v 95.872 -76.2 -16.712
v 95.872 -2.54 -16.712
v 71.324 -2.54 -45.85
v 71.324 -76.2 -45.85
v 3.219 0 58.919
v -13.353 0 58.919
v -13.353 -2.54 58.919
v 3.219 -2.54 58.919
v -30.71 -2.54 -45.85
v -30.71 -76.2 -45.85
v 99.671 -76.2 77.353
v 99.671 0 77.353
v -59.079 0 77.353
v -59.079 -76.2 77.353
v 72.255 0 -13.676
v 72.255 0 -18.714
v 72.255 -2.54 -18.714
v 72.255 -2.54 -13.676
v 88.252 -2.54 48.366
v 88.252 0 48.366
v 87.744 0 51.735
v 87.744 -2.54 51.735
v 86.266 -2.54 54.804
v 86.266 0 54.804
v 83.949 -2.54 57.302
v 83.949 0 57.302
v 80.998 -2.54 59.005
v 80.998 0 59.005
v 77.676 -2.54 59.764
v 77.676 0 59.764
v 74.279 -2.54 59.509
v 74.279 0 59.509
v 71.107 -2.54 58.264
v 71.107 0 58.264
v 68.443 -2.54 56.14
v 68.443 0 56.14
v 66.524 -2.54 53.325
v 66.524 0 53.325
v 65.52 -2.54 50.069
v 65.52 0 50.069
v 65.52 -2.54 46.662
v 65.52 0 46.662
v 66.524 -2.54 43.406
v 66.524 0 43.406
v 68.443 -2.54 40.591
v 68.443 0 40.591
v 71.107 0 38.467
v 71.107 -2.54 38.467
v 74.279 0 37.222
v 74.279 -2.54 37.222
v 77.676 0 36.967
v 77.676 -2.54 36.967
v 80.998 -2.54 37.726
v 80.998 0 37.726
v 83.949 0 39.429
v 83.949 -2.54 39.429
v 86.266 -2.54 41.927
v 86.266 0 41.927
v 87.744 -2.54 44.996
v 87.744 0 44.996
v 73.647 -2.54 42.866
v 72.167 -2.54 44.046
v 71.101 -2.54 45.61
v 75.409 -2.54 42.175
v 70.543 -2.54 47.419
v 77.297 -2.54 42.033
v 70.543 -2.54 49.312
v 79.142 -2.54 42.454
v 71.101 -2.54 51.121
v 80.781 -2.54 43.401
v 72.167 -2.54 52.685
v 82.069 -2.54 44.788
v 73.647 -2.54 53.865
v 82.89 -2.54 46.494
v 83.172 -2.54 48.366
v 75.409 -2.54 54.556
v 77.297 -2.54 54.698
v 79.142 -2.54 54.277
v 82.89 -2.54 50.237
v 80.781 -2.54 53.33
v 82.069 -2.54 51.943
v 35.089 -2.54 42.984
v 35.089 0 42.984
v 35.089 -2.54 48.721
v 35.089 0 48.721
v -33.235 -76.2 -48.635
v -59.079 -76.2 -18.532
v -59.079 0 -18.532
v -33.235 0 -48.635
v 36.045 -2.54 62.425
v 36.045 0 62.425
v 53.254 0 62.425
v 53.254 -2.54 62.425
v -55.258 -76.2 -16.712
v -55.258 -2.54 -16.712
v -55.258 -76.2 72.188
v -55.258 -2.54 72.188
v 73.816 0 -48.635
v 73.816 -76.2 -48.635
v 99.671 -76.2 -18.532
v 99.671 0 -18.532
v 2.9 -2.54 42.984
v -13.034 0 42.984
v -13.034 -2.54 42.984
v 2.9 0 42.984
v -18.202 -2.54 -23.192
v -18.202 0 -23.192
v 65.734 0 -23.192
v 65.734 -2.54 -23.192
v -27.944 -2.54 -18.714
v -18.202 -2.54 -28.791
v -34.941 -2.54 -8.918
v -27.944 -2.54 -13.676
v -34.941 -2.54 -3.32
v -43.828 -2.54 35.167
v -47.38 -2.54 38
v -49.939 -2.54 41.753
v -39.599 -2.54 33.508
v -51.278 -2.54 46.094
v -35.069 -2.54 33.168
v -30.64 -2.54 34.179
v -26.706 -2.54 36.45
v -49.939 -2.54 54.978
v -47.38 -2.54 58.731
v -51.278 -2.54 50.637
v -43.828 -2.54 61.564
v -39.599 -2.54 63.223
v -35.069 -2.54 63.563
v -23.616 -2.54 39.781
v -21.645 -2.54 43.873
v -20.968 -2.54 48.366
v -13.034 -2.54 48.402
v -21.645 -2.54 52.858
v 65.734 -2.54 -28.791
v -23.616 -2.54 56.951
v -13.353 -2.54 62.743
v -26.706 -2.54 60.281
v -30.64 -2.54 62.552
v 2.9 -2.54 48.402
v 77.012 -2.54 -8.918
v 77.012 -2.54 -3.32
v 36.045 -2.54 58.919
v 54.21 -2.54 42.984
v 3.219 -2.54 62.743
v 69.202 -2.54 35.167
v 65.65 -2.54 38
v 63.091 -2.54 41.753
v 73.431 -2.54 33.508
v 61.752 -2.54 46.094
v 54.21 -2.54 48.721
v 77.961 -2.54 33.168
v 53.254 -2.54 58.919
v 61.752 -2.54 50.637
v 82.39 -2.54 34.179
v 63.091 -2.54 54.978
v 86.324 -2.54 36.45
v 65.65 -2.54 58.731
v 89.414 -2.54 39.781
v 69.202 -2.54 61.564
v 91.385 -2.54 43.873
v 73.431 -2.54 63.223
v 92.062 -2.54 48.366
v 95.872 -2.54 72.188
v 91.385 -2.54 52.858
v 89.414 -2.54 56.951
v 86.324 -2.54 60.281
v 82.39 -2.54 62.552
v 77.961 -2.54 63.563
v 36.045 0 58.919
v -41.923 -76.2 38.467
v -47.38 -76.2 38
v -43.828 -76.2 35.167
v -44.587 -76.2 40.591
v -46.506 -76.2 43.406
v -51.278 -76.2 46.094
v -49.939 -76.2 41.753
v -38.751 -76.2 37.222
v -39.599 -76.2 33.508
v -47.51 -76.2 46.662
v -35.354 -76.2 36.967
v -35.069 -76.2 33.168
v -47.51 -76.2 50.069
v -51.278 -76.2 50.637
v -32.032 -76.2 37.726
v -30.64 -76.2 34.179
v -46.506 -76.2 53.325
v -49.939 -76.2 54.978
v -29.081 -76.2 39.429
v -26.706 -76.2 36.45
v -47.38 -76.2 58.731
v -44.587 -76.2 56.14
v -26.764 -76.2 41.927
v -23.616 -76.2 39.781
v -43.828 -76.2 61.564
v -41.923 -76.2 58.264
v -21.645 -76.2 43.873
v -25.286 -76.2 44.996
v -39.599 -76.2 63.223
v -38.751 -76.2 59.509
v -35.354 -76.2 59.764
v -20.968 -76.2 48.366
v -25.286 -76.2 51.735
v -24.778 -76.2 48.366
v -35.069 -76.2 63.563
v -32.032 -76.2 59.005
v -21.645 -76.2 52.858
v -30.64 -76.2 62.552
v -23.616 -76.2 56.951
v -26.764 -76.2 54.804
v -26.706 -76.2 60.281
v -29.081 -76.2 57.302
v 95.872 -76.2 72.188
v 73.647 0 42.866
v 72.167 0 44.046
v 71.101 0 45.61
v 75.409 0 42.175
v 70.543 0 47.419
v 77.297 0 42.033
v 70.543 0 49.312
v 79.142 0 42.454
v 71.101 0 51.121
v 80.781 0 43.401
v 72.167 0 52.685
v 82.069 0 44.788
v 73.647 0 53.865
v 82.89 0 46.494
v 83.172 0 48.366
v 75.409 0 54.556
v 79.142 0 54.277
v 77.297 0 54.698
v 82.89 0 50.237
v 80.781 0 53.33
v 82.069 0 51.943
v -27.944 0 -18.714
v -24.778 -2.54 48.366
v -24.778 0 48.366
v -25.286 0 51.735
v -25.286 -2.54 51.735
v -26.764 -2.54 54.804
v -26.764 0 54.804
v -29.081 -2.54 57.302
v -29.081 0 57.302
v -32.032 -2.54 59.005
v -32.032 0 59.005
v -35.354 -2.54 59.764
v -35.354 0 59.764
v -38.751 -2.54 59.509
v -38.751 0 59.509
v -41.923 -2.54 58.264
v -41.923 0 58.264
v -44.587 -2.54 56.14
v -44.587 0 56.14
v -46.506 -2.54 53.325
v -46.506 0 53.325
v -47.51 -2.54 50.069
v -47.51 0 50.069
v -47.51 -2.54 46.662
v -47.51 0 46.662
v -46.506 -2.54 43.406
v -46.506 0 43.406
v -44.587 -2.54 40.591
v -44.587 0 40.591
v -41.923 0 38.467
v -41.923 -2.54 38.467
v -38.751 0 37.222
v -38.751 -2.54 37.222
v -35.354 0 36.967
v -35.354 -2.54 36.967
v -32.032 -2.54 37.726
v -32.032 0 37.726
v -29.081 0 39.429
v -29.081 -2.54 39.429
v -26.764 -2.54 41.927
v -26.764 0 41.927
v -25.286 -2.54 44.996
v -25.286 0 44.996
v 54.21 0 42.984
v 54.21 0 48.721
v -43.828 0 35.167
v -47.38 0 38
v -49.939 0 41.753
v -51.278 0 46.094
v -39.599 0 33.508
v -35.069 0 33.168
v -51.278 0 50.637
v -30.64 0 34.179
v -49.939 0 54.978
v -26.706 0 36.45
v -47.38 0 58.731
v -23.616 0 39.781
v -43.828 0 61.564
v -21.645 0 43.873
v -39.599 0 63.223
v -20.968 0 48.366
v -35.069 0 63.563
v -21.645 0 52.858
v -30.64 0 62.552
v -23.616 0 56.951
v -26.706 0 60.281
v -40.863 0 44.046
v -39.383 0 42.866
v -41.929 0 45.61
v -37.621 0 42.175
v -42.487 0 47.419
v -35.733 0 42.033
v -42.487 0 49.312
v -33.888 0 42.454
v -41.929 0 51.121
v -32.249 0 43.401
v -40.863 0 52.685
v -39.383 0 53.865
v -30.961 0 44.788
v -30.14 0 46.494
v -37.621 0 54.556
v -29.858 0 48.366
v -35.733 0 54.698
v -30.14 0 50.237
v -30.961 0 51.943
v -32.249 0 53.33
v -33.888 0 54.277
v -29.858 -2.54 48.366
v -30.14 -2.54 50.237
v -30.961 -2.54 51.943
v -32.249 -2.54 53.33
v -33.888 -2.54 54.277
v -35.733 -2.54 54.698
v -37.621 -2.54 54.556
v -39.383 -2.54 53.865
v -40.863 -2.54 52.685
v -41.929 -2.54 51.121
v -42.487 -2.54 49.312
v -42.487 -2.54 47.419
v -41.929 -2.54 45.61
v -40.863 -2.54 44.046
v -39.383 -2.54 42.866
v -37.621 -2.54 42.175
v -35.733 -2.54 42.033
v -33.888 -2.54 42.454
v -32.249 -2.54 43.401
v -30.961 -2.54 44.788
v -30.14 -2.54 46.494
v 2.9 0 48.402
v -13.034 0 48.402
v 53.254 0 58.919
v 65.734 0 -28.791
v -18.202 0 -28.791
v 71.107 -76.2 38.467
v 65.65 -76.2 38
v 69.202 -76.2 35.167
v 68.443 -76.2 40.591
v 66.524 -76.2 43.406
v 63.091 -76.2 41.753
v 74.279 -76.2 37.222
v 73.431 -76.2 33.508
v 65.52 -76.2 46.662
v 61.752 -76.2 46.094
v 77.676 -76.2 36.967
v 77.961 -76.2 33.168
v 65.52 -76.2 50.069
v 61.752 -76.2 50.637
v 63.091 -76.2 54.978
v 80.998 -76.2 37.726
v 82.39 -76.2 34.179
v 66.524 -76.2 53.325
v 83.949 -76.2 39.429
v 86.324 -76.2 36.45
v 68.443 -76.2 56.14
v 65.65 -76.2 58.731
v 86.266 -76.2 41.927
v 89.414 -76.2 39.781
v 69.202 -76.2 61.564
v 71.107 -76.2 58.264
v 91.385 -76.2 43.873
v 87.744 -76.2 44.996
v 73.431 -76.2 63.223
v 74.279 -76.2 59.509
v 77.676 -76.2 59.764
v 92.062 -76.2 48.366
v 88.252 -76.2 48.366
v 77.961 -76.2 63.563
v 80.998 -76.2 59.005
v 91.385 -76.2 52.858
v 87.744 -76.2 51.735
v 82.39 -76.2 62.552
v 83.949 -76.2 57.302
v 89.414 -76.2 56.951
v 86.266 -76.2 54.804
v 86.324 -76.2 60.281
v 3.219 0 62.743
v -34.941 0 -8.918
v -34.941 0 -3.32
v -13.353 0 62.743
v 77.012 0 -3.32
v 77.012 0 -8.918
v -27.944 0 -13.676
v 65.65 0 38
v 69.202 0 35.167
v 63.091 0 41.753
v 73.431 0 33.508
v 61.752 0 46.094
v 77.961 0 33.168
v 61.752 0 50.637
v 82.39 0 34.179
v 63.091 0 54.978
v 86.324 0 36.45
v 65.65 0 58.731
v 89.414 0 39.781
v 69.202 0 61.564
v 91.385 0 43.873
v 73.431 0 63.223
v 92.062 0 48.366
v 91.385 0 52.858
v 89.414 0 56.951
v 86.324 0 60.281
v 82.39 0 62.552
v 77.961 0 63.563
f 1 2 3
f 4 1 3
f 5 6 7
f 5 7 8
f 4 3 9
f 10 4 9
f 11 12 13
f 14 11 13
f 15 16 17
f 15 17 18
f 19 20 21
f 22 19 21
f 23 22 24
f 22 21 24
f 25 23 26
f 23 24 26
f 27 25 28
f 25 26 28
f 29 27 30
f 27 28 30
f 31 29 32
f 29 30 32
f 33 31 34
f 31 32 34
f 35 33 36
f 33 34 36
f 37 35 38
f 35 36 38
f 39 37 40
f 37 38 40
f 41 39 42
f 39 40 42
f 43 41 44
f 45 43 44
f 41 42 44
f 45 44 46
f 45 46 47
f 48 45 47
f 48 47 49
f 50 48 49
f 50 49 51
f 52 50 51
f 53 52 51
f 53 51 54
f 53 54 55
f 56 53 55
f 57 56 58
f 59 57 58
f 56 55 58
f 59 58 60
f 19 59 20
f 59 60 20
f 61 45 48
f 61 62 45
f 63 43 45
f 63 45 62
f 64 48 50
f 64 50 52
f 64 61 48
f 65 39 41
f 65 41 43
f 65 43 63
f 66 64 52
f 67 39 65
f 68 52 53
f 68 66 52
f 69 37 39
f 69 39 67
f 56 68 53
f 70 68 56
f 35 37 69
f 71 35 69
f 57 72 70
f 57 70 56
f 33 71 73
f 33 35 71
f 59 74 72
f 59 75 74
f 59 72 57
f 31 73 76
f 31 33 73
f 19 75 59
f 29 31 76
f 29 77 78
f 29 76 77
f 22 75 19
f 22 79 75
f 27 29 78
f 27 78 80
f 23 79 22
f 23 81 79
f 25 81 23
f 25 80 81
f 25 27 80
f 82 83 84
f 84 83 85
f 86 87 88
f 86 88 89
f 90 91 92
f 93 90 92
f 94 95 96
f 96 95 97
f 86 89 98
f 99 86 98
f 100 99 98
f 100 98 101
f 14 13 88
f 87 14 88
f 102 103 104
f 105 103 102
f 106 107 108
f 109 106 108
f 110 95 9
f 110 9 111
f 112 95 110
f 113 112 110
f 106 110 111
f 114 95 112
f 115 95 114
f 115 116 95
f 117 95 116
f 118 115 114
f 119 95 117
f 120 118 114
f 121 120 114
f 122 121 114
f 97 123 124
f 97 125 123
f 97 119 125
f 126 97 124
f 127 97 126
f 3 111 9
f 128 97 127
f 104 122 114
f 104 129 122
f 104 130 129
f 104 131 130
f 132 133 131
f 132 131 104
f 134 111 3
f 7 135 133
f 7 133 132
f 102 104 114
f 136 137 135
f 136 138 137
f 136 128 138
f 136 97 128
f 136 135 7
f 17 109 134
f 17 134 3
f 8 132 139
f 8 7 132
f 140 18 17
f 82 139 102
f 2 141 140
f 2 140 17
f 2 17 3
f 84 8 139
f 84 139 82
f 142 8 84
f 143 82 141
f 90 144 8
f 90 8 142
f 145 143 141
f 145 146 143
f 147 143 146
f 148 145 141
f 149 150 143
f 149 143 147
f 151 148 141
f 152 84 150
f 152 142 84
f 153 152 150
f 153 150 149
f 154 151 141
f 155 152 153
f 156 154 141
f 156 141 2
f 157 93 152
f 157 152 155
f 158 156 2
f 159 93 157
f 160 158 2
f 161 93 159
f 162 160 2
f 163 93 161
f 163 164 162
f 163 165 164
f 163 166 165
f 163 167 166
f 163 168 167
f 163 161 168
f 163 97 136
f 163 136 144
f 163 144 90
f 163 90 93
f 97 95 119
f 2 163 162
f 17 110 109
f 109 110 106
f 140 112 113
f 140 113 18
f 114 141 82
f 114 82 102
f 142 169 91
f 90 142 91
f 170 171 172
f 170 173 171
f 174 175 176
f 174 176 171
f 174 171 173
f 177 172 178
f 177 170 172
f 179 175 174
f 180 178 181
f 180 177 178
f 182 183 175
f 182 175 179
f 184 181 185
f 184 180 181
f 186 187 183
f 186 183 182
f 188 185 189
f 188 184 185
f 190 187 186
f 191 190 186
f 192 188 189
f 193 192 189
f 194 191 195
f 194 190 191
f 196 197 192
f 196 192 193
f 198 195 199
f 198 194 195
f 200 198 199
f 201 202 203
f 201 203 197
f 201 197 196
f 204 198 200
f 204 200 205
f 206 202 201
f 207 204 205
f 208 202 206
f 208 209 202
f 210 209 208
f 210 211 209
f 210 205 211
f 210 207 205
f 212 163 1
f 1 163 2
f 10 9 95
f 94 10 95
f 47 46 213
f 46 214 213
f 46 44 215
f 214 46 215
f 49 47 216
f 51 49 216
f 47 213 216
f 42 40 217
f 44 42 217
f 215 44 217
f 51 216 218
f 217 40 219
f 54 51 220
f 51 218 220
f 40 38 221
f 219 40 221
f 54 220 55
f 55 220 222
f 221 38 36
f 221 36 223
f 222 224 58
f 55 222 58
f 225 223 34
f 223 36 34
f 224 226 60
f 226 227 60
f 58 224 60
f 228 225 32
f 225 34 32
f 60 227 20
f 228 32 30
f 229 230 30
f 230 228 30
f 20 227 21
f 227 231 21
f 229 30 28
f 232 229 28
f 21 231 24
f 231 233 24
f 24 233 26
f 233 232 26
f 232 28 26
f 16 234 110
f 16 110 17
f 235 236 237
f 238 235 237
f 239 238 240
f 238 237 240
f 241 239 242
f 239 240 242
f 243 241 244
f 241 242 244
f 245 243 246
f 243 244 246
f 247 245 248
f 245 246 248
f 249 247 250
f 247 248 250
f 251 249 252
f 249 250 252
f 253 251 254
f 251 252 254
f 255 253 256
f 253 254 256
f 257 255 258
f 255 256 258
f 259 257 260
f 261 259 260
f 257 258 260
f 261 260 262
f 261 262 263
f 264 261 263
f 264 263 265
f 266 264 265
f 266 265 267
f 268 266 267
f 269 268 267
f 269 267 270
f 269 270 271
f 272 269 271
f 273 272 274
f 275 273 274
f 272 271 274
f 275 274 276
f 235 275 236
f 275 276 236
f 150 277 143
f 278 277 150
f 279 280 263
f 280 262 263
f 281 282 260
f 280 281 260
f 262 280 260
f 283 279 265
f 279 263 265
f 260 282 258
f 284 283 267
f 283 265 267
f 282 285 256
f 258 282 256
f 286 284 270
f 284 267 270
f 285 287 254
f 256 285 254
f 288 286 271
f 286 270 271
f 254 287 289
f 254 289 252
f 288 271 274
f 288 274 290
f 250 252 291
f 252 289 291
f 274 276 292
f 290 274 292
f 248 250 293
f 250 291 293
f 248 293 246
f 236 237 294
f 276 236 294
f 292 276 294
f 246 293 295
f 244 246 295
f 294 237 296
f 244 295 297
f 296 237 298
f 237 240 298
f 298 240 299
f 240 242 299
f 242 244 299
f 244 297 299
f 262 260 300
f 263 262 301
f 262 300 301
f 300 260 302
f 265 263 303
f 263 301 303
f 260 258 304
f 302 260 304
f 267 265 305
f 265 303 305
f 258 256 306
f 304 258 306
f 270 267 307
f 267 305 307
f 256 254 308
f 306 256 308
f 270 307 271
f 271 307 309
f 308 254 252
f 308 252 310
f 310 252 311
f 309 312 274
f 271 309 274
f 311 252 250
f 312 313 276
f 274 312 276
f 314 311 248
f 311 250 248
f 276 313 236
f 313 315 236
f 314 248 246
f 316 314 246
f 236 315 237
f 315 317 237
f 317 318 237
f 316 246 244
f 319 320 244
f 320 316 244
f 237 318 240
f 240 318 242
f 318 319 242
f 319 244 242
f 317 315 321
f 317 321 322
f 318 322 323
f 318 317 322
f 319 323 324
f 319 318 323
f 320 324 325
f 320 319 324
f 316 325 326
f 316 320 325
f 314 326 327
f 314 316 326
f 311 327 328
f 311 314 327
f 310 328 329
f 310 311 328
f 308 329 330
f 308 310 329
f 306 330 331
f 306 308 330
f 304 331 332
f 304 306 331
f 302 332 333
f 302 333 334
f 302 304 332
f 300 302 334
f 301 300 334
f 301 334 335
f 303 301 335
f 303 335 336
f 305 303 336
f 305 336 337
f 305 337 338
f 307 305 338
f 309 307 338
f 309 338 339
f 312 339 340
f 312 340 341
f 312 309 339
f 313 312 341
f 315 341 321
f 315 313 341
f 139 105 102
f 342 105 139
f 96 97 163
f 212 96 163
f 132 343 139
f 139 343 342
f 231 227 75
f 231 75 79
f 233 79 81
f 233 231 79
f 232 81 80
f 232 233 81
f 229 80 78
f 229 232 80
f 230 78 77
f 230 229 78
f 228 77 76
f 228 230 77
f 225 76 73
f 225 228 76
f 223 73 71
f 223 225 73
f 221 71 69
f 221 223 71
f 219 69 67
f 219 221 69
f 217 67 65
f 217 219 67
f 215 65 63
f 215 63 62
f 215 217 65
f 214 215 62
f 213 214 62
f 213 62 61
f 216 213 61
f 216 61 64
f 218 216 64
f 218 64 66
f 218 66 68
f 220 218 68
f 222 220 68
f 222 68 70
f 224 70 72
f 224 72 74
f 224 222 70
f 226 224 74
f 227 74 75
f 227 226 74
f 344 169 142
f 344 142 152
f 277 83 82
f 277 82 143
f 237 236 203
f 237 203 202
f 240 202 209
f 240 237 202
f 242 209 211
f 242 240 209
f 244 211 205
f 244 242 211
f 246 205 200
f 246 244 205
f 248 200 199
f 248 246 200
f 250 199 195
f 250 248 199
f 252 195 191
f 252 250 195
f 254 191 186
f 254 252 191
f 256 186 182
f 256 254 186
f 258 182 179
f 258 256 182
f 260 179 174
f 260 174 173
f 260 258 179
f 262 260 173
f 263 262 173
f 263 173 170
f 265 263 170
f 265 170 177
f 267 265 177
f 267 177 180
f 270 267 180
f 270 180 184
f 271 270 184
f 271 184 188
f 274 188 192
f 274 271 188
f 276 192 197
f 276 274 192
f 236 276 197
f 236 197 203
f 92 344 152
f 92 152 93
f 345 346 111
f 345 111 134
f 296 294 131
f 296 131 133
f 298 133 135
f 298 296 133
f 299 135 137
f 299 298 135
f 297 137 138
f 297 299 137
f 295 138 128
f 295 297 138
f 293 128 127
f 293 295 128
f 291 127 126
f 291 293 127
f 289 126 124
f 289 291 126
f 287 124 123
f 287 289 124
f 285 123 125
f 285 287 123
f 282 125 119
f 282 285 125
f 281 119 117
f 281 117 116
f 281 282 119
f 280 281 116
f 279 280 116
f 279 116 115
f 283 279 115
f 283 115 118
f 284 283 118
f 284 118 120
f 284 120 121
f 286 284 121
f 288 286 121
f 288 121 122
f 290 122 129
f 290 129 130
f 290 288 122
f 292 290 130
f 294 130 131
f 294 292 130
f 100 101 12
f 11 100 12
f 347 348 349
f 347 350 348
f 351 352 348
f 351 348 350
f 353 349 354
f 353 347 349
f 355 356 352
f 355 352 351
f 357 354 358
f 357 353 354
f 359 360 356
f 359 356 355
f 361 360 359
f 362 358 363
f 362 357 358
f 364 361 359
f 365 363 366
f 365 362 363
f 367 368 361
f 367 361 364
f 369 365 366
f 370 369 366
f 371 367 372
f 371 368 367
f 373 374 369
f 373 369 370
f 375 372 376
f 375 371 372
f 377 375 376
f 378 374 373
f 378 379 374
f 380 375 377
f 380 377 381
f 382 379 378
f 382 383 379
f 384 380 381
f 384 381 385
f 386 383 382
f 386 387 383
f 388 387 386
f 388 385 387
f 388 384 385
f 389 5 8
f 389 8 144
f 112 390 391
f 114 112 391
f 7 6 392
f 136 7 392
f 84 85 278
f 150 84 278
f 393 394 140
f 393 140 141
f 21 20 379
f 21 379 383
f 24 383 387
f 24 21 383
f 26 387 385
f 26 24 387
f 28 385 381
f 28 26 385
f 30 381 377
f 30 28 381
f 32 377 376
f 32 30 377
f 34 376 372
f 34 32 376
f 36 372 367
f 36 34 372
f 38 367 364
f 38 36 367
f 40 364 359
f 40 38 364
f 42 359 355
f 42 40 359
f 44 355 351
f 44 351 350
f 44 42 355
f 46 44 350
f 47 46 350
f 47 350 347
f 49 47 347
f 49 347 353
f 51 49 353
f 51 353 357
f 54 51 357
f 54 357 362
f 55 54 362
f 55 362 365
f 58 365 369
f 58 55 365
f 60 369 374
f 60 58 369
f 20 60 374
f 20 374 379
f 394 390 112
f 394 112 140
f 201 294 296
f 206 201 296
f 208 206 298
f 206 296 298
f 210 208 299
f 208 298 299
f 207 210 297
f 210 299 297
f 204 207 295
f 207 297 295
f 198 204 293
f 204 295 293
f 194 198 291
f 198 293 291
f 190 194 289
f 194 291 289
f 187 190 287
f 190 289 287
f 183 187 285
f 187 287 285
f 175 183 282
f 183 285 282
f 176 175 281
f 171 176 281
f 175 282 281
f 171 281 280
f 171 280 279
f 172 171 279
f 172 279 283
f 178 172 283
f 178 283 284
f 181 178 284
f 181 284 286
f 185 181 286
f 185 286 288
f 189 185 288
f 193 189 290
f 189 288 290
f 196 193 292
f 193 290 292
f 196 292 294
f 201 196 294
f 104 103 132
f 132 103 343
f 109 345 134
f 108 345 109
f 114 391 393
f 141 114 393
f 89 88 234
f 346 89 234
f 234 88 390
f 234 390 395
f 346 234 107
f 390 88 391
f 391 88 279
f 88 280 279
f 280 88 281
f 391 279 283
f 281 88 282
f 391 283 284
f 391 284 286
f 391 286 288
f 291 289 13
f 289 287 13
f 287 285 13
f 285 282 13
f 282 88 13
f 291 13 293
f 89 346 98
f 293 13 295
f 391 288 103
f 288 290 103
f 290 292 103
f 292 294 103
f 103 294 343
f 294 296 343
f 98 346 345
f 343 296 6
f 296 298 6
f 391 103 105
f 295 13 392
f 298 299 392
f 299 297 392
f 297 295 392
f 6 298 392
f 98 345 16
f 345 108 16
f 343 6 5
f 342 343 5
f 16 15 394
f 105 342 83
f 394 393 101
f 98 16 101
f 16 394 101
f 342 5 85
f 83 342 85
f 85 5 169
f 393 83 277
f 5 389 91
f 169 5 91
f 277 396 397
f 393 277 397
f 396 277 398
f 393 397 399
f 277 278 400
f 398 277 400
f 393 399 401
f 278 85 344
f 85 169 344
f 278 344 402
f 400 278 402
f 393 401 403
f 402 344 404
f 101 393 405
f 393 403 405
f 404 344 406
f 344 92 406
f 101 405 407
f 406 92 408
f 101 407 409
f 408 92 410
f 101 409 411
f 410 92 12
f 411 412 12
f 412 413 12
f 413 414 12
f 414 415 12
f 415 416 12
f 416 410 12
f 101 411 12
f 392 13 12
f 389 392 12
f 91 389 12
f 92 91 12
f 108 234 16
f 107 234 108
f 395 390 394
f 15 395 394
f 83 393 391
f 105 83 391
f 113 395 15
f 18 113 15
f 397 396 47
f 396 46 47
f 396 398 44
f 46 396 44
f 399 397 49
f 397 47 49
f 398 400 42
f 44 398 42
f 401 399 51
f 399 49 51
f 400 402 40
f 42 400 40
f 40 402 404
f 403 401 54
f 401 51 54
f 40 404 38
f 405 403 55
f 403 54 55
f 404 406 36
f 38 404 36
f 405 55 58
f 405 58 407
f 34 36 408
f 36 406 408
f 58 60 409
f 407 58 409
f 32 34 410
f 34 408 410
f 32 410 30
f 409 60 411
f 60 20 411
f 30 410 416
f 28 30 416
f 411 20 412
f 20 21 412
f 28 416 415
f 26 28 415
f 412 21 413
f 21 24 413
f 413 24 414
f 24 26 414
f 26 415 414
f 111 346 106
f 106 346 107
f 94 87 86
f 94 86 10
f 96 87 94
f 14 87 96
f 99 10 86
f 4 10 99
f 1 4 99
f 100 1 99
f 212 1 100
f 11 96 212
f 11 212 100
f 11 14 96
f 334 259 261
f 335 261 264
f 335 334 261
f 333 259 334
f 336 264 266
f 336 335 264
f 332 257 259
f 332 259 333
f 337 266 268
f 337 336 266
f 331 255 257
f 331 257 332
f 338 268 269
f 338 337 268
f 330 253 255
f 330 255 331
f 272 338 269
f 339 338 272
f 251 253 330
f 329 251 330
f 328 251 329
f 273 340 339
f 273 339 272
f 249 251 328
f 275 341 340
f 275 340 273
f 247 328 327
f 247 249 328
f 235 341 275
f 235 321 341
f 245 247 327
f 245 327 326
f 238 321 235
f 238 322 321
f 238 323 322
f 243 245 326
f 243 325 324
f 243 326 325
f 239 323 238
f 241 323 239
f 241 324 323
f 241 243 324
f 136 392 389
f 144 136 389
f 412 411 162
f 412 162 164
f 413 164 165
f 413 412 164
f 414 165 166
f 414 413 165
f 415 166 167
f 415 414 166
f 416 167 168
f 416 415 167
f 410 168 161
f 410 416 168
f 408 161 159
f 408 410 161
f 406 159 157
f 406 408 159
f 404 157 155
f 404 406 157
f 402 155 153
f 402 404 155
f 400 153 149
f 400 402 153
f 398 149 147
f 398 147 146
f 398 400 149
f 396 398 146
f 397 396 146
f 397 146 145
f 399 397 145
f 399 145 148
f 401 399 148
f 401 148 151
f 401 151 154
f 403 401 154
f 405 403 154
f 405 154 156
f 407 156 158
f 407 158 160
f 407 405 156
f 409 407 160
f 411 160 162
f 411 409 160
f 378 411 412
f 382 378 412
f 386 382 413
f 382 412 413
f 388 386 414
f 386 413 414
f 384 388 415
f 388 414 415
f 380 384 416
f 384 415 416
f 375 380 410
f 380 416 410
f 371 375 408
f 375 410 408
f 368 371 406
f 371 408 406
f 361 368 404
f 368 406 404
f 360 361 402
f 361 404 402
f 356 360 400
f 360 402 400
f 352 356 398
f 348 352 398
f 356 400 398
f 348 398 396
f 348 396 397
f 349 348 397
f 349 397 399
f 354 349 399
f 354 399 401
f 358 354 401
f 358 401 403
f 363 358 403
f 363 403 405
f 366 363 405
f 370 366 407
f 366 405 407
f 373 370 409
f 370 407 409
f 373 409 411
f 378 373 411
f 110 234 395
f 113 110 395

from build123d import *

# Parameters (mm, degrees)
F1_DEPTH = 76.2
F0_R     = 6.35
F0_W     = 83.9361876732
F0_H     = 5.5990750616
F0_W_2   = 100.1986385042
F0_H_2   = 5.0378413871
F0_W_3   = 111.9520328939
F0_H_3   = 5.5976028088
F0_W_4   = 15.9347772133
F0_H_4   = 5.4178200662
F0_R_2   = 15.24
F0_W_5   = 16.5721669327
F0_H_5   = 3.8243457675
F0_W_6   = 19.1217325628
F0_H_6   = 5.736514926
F0_W_7   = 17.209559679
F0_H_7   = 3.5056509078
F3_DEPTH = 2.54
F0_R_3   = 11.43
F4_DEPTH = 25.4
F5_DEPTH = 76.2


with BuildPart() as f1:
    # F0 (on Front) → F1 (new body)
    with BuildSketch(Plane.XZ):
        Polygon((99.6708340498, 77.3534489229), (-59.0791659502, 77.3534489229), (-59.0791659502, -18.5315510771), (-33.2354940474, -48.6346136725), (73.8162100315, -48.6346136725), (99.6708340498, -18.5315510771), align=None)
        Polygon((-55.2578138162, -16.7123815692), (-55.2578138162, 72.1876184308), (95.8721861838, 72.1876184308), (95.8721861838, -16.7123815692), (71.3240179544, -45.8499421496), (-30.7096455867, -45.8499421496), align=None, mode=Mode.SUBTRACT)
    extrude(amount=F1_DEPTH)

    # F0 (on Front) → F3 (join)
    with BuildSketch(Plane.XZ):
        Polygon((95.8721861838, 72.1876184308), (-55.2578138162, 72.1876184308), (-55.2578138162, -16.7123815692), (-30.7096455867, -45.8499421496), (71.3240179544, -45.8499421496), (95.8721861838, -16.7123815692), align=None)
        with Locations((23.7656522681, -25.9913175088)):
            Rectangle(F0_W, F0_H, mode=Mode.SUBTRACT)
        with Locations((22.1557993767, -16.194622498)):
            Rectangle(F0_W_2, F0_H_2, mode=Mode.SUBTRACT)
        with Locations((21.0354942828, -6.1189391417)):
            Rectangle(F0_W_3, F0_H_3, mode=Mode.SUBTRACT)
        with Locations((-5.0669364864, 45.6930417567)):
            Rectangle(F0_W_4, F0_H_4, mode=Mode.SUBTRACT)
        with Locations((-36.2078138162, 48.3655110002)):
            Circle(F0_R_2, mode=Mode.SUBTRACT)
        with Locations((-5.0669374177, 60.8310811222)):
            Rectangle(F0_W_5, F0_H_5, mode=Mode.SUBTRACT)
        with Locations((44.6495655924, 45.8523891866)):
            Rectangle(F0_W_6, F0_H_6, mode=Mode.SUBTRACT)
        with Locations((44.6495637298, 60.6717336923)):
            Rectangle(F0_W_7, F0_H_7, mode=Mode.SUBTRACT)
        with Locations((76.8221861838, 48.3655110002)):
            Circle(F0_R_2, mode=Mode.SUBTRACT)
    extrude(amount=F3_DEPTH)

    # F0 (on Front) → F4 (join)
    with BuildSketch(Plane.XZ):
        Polygon((99.6708340498, 77.3534489229), (-59.0791659502, 77.3534489229), (-59.0791659502, -18.5315510771), (-33.2354940474, -48.6346136725), (73.8162100315, -48.6346136725), (99.6708340498, -18.5315510771), align=None)
        Polygon((-55.2578138162, -16.7123815692), (-55.2578138162, 72.1876184308), (95.8721861838, 72.1876184308), (95.8721861838, -16.7123815692), (71.3240179544, -45.8499421496), (-30.7096455867, -45.8499421496), align=None, mode=Mode.SUBTRACT)
    extrude(amount=F4_DEPTH)


with BuildPart() as f1b:
    # F0 (on Front) → F1, piece 2 (new body)
    with BuildSketch(Plane.XZ):
        with Locations((-36.2078138162, 48.3655110002)):
            Circle(F0_R)
    extrude(amount=F1_DEPTH)


with BuildPart() as f3:
    # F0 (on Front) → F3, piece 2 (new body)
    with BuildSketch(Plane.XZ):
        with Locations((-36.2078138162, 48.3655110002)):
            Circle(F0_R_3)
        with Locations((-36.2078138162, 48.3655110002)):
            Circle(F0_R, mode=Mode.SUBTRACT)
    extrude(amount=F3_DEPTH)


with BuildPart() as f3b:
    # F0 (on Front) → F3, piece 3 (new body)
    with BuildSketch(Plane.XZ):
        with Locations((76.8221861838, 48.3655110002)):
            Circle(F0_R_3)
        with Locations((76.8221861838, 48.3655110002)):
            Circle(F0_R, mode=Mode.SUBTRACT)
    extrude(amount=F3_DEPTH)


with BuildPart() as f5:
    # F0 (on Front) → F5 (new body)
    with BuildSketch(Plane.XZ):
        with Locations((-36.2078138162, 48.3655110002)):
            Circle(F0_R_2)
        with Locations((-36.2078138162, 48.3655110002)):
            Circle(F0_R_3, mode=Mode.SUBTRACT)
    extrude(amount=F5_DEPTH)


with BuildPart() as f5b:
    # F0 (on Front) → F5, piece 2 (new body)
    with BuildSketch(Plane.XZ):
        with Locations((76.8221861838, 48.3655110002)):
            Circle(F0_R_2)
        with Locations((76.8221861838, 48.3655110002)):
            Circle(F0_R_3, mode=Mode.SUBTRACT)
    extrude(amount=F5_DEPTH)


solid = Compound([f1.part, f3.part, f3b.part, f5.part, f5b.part])
